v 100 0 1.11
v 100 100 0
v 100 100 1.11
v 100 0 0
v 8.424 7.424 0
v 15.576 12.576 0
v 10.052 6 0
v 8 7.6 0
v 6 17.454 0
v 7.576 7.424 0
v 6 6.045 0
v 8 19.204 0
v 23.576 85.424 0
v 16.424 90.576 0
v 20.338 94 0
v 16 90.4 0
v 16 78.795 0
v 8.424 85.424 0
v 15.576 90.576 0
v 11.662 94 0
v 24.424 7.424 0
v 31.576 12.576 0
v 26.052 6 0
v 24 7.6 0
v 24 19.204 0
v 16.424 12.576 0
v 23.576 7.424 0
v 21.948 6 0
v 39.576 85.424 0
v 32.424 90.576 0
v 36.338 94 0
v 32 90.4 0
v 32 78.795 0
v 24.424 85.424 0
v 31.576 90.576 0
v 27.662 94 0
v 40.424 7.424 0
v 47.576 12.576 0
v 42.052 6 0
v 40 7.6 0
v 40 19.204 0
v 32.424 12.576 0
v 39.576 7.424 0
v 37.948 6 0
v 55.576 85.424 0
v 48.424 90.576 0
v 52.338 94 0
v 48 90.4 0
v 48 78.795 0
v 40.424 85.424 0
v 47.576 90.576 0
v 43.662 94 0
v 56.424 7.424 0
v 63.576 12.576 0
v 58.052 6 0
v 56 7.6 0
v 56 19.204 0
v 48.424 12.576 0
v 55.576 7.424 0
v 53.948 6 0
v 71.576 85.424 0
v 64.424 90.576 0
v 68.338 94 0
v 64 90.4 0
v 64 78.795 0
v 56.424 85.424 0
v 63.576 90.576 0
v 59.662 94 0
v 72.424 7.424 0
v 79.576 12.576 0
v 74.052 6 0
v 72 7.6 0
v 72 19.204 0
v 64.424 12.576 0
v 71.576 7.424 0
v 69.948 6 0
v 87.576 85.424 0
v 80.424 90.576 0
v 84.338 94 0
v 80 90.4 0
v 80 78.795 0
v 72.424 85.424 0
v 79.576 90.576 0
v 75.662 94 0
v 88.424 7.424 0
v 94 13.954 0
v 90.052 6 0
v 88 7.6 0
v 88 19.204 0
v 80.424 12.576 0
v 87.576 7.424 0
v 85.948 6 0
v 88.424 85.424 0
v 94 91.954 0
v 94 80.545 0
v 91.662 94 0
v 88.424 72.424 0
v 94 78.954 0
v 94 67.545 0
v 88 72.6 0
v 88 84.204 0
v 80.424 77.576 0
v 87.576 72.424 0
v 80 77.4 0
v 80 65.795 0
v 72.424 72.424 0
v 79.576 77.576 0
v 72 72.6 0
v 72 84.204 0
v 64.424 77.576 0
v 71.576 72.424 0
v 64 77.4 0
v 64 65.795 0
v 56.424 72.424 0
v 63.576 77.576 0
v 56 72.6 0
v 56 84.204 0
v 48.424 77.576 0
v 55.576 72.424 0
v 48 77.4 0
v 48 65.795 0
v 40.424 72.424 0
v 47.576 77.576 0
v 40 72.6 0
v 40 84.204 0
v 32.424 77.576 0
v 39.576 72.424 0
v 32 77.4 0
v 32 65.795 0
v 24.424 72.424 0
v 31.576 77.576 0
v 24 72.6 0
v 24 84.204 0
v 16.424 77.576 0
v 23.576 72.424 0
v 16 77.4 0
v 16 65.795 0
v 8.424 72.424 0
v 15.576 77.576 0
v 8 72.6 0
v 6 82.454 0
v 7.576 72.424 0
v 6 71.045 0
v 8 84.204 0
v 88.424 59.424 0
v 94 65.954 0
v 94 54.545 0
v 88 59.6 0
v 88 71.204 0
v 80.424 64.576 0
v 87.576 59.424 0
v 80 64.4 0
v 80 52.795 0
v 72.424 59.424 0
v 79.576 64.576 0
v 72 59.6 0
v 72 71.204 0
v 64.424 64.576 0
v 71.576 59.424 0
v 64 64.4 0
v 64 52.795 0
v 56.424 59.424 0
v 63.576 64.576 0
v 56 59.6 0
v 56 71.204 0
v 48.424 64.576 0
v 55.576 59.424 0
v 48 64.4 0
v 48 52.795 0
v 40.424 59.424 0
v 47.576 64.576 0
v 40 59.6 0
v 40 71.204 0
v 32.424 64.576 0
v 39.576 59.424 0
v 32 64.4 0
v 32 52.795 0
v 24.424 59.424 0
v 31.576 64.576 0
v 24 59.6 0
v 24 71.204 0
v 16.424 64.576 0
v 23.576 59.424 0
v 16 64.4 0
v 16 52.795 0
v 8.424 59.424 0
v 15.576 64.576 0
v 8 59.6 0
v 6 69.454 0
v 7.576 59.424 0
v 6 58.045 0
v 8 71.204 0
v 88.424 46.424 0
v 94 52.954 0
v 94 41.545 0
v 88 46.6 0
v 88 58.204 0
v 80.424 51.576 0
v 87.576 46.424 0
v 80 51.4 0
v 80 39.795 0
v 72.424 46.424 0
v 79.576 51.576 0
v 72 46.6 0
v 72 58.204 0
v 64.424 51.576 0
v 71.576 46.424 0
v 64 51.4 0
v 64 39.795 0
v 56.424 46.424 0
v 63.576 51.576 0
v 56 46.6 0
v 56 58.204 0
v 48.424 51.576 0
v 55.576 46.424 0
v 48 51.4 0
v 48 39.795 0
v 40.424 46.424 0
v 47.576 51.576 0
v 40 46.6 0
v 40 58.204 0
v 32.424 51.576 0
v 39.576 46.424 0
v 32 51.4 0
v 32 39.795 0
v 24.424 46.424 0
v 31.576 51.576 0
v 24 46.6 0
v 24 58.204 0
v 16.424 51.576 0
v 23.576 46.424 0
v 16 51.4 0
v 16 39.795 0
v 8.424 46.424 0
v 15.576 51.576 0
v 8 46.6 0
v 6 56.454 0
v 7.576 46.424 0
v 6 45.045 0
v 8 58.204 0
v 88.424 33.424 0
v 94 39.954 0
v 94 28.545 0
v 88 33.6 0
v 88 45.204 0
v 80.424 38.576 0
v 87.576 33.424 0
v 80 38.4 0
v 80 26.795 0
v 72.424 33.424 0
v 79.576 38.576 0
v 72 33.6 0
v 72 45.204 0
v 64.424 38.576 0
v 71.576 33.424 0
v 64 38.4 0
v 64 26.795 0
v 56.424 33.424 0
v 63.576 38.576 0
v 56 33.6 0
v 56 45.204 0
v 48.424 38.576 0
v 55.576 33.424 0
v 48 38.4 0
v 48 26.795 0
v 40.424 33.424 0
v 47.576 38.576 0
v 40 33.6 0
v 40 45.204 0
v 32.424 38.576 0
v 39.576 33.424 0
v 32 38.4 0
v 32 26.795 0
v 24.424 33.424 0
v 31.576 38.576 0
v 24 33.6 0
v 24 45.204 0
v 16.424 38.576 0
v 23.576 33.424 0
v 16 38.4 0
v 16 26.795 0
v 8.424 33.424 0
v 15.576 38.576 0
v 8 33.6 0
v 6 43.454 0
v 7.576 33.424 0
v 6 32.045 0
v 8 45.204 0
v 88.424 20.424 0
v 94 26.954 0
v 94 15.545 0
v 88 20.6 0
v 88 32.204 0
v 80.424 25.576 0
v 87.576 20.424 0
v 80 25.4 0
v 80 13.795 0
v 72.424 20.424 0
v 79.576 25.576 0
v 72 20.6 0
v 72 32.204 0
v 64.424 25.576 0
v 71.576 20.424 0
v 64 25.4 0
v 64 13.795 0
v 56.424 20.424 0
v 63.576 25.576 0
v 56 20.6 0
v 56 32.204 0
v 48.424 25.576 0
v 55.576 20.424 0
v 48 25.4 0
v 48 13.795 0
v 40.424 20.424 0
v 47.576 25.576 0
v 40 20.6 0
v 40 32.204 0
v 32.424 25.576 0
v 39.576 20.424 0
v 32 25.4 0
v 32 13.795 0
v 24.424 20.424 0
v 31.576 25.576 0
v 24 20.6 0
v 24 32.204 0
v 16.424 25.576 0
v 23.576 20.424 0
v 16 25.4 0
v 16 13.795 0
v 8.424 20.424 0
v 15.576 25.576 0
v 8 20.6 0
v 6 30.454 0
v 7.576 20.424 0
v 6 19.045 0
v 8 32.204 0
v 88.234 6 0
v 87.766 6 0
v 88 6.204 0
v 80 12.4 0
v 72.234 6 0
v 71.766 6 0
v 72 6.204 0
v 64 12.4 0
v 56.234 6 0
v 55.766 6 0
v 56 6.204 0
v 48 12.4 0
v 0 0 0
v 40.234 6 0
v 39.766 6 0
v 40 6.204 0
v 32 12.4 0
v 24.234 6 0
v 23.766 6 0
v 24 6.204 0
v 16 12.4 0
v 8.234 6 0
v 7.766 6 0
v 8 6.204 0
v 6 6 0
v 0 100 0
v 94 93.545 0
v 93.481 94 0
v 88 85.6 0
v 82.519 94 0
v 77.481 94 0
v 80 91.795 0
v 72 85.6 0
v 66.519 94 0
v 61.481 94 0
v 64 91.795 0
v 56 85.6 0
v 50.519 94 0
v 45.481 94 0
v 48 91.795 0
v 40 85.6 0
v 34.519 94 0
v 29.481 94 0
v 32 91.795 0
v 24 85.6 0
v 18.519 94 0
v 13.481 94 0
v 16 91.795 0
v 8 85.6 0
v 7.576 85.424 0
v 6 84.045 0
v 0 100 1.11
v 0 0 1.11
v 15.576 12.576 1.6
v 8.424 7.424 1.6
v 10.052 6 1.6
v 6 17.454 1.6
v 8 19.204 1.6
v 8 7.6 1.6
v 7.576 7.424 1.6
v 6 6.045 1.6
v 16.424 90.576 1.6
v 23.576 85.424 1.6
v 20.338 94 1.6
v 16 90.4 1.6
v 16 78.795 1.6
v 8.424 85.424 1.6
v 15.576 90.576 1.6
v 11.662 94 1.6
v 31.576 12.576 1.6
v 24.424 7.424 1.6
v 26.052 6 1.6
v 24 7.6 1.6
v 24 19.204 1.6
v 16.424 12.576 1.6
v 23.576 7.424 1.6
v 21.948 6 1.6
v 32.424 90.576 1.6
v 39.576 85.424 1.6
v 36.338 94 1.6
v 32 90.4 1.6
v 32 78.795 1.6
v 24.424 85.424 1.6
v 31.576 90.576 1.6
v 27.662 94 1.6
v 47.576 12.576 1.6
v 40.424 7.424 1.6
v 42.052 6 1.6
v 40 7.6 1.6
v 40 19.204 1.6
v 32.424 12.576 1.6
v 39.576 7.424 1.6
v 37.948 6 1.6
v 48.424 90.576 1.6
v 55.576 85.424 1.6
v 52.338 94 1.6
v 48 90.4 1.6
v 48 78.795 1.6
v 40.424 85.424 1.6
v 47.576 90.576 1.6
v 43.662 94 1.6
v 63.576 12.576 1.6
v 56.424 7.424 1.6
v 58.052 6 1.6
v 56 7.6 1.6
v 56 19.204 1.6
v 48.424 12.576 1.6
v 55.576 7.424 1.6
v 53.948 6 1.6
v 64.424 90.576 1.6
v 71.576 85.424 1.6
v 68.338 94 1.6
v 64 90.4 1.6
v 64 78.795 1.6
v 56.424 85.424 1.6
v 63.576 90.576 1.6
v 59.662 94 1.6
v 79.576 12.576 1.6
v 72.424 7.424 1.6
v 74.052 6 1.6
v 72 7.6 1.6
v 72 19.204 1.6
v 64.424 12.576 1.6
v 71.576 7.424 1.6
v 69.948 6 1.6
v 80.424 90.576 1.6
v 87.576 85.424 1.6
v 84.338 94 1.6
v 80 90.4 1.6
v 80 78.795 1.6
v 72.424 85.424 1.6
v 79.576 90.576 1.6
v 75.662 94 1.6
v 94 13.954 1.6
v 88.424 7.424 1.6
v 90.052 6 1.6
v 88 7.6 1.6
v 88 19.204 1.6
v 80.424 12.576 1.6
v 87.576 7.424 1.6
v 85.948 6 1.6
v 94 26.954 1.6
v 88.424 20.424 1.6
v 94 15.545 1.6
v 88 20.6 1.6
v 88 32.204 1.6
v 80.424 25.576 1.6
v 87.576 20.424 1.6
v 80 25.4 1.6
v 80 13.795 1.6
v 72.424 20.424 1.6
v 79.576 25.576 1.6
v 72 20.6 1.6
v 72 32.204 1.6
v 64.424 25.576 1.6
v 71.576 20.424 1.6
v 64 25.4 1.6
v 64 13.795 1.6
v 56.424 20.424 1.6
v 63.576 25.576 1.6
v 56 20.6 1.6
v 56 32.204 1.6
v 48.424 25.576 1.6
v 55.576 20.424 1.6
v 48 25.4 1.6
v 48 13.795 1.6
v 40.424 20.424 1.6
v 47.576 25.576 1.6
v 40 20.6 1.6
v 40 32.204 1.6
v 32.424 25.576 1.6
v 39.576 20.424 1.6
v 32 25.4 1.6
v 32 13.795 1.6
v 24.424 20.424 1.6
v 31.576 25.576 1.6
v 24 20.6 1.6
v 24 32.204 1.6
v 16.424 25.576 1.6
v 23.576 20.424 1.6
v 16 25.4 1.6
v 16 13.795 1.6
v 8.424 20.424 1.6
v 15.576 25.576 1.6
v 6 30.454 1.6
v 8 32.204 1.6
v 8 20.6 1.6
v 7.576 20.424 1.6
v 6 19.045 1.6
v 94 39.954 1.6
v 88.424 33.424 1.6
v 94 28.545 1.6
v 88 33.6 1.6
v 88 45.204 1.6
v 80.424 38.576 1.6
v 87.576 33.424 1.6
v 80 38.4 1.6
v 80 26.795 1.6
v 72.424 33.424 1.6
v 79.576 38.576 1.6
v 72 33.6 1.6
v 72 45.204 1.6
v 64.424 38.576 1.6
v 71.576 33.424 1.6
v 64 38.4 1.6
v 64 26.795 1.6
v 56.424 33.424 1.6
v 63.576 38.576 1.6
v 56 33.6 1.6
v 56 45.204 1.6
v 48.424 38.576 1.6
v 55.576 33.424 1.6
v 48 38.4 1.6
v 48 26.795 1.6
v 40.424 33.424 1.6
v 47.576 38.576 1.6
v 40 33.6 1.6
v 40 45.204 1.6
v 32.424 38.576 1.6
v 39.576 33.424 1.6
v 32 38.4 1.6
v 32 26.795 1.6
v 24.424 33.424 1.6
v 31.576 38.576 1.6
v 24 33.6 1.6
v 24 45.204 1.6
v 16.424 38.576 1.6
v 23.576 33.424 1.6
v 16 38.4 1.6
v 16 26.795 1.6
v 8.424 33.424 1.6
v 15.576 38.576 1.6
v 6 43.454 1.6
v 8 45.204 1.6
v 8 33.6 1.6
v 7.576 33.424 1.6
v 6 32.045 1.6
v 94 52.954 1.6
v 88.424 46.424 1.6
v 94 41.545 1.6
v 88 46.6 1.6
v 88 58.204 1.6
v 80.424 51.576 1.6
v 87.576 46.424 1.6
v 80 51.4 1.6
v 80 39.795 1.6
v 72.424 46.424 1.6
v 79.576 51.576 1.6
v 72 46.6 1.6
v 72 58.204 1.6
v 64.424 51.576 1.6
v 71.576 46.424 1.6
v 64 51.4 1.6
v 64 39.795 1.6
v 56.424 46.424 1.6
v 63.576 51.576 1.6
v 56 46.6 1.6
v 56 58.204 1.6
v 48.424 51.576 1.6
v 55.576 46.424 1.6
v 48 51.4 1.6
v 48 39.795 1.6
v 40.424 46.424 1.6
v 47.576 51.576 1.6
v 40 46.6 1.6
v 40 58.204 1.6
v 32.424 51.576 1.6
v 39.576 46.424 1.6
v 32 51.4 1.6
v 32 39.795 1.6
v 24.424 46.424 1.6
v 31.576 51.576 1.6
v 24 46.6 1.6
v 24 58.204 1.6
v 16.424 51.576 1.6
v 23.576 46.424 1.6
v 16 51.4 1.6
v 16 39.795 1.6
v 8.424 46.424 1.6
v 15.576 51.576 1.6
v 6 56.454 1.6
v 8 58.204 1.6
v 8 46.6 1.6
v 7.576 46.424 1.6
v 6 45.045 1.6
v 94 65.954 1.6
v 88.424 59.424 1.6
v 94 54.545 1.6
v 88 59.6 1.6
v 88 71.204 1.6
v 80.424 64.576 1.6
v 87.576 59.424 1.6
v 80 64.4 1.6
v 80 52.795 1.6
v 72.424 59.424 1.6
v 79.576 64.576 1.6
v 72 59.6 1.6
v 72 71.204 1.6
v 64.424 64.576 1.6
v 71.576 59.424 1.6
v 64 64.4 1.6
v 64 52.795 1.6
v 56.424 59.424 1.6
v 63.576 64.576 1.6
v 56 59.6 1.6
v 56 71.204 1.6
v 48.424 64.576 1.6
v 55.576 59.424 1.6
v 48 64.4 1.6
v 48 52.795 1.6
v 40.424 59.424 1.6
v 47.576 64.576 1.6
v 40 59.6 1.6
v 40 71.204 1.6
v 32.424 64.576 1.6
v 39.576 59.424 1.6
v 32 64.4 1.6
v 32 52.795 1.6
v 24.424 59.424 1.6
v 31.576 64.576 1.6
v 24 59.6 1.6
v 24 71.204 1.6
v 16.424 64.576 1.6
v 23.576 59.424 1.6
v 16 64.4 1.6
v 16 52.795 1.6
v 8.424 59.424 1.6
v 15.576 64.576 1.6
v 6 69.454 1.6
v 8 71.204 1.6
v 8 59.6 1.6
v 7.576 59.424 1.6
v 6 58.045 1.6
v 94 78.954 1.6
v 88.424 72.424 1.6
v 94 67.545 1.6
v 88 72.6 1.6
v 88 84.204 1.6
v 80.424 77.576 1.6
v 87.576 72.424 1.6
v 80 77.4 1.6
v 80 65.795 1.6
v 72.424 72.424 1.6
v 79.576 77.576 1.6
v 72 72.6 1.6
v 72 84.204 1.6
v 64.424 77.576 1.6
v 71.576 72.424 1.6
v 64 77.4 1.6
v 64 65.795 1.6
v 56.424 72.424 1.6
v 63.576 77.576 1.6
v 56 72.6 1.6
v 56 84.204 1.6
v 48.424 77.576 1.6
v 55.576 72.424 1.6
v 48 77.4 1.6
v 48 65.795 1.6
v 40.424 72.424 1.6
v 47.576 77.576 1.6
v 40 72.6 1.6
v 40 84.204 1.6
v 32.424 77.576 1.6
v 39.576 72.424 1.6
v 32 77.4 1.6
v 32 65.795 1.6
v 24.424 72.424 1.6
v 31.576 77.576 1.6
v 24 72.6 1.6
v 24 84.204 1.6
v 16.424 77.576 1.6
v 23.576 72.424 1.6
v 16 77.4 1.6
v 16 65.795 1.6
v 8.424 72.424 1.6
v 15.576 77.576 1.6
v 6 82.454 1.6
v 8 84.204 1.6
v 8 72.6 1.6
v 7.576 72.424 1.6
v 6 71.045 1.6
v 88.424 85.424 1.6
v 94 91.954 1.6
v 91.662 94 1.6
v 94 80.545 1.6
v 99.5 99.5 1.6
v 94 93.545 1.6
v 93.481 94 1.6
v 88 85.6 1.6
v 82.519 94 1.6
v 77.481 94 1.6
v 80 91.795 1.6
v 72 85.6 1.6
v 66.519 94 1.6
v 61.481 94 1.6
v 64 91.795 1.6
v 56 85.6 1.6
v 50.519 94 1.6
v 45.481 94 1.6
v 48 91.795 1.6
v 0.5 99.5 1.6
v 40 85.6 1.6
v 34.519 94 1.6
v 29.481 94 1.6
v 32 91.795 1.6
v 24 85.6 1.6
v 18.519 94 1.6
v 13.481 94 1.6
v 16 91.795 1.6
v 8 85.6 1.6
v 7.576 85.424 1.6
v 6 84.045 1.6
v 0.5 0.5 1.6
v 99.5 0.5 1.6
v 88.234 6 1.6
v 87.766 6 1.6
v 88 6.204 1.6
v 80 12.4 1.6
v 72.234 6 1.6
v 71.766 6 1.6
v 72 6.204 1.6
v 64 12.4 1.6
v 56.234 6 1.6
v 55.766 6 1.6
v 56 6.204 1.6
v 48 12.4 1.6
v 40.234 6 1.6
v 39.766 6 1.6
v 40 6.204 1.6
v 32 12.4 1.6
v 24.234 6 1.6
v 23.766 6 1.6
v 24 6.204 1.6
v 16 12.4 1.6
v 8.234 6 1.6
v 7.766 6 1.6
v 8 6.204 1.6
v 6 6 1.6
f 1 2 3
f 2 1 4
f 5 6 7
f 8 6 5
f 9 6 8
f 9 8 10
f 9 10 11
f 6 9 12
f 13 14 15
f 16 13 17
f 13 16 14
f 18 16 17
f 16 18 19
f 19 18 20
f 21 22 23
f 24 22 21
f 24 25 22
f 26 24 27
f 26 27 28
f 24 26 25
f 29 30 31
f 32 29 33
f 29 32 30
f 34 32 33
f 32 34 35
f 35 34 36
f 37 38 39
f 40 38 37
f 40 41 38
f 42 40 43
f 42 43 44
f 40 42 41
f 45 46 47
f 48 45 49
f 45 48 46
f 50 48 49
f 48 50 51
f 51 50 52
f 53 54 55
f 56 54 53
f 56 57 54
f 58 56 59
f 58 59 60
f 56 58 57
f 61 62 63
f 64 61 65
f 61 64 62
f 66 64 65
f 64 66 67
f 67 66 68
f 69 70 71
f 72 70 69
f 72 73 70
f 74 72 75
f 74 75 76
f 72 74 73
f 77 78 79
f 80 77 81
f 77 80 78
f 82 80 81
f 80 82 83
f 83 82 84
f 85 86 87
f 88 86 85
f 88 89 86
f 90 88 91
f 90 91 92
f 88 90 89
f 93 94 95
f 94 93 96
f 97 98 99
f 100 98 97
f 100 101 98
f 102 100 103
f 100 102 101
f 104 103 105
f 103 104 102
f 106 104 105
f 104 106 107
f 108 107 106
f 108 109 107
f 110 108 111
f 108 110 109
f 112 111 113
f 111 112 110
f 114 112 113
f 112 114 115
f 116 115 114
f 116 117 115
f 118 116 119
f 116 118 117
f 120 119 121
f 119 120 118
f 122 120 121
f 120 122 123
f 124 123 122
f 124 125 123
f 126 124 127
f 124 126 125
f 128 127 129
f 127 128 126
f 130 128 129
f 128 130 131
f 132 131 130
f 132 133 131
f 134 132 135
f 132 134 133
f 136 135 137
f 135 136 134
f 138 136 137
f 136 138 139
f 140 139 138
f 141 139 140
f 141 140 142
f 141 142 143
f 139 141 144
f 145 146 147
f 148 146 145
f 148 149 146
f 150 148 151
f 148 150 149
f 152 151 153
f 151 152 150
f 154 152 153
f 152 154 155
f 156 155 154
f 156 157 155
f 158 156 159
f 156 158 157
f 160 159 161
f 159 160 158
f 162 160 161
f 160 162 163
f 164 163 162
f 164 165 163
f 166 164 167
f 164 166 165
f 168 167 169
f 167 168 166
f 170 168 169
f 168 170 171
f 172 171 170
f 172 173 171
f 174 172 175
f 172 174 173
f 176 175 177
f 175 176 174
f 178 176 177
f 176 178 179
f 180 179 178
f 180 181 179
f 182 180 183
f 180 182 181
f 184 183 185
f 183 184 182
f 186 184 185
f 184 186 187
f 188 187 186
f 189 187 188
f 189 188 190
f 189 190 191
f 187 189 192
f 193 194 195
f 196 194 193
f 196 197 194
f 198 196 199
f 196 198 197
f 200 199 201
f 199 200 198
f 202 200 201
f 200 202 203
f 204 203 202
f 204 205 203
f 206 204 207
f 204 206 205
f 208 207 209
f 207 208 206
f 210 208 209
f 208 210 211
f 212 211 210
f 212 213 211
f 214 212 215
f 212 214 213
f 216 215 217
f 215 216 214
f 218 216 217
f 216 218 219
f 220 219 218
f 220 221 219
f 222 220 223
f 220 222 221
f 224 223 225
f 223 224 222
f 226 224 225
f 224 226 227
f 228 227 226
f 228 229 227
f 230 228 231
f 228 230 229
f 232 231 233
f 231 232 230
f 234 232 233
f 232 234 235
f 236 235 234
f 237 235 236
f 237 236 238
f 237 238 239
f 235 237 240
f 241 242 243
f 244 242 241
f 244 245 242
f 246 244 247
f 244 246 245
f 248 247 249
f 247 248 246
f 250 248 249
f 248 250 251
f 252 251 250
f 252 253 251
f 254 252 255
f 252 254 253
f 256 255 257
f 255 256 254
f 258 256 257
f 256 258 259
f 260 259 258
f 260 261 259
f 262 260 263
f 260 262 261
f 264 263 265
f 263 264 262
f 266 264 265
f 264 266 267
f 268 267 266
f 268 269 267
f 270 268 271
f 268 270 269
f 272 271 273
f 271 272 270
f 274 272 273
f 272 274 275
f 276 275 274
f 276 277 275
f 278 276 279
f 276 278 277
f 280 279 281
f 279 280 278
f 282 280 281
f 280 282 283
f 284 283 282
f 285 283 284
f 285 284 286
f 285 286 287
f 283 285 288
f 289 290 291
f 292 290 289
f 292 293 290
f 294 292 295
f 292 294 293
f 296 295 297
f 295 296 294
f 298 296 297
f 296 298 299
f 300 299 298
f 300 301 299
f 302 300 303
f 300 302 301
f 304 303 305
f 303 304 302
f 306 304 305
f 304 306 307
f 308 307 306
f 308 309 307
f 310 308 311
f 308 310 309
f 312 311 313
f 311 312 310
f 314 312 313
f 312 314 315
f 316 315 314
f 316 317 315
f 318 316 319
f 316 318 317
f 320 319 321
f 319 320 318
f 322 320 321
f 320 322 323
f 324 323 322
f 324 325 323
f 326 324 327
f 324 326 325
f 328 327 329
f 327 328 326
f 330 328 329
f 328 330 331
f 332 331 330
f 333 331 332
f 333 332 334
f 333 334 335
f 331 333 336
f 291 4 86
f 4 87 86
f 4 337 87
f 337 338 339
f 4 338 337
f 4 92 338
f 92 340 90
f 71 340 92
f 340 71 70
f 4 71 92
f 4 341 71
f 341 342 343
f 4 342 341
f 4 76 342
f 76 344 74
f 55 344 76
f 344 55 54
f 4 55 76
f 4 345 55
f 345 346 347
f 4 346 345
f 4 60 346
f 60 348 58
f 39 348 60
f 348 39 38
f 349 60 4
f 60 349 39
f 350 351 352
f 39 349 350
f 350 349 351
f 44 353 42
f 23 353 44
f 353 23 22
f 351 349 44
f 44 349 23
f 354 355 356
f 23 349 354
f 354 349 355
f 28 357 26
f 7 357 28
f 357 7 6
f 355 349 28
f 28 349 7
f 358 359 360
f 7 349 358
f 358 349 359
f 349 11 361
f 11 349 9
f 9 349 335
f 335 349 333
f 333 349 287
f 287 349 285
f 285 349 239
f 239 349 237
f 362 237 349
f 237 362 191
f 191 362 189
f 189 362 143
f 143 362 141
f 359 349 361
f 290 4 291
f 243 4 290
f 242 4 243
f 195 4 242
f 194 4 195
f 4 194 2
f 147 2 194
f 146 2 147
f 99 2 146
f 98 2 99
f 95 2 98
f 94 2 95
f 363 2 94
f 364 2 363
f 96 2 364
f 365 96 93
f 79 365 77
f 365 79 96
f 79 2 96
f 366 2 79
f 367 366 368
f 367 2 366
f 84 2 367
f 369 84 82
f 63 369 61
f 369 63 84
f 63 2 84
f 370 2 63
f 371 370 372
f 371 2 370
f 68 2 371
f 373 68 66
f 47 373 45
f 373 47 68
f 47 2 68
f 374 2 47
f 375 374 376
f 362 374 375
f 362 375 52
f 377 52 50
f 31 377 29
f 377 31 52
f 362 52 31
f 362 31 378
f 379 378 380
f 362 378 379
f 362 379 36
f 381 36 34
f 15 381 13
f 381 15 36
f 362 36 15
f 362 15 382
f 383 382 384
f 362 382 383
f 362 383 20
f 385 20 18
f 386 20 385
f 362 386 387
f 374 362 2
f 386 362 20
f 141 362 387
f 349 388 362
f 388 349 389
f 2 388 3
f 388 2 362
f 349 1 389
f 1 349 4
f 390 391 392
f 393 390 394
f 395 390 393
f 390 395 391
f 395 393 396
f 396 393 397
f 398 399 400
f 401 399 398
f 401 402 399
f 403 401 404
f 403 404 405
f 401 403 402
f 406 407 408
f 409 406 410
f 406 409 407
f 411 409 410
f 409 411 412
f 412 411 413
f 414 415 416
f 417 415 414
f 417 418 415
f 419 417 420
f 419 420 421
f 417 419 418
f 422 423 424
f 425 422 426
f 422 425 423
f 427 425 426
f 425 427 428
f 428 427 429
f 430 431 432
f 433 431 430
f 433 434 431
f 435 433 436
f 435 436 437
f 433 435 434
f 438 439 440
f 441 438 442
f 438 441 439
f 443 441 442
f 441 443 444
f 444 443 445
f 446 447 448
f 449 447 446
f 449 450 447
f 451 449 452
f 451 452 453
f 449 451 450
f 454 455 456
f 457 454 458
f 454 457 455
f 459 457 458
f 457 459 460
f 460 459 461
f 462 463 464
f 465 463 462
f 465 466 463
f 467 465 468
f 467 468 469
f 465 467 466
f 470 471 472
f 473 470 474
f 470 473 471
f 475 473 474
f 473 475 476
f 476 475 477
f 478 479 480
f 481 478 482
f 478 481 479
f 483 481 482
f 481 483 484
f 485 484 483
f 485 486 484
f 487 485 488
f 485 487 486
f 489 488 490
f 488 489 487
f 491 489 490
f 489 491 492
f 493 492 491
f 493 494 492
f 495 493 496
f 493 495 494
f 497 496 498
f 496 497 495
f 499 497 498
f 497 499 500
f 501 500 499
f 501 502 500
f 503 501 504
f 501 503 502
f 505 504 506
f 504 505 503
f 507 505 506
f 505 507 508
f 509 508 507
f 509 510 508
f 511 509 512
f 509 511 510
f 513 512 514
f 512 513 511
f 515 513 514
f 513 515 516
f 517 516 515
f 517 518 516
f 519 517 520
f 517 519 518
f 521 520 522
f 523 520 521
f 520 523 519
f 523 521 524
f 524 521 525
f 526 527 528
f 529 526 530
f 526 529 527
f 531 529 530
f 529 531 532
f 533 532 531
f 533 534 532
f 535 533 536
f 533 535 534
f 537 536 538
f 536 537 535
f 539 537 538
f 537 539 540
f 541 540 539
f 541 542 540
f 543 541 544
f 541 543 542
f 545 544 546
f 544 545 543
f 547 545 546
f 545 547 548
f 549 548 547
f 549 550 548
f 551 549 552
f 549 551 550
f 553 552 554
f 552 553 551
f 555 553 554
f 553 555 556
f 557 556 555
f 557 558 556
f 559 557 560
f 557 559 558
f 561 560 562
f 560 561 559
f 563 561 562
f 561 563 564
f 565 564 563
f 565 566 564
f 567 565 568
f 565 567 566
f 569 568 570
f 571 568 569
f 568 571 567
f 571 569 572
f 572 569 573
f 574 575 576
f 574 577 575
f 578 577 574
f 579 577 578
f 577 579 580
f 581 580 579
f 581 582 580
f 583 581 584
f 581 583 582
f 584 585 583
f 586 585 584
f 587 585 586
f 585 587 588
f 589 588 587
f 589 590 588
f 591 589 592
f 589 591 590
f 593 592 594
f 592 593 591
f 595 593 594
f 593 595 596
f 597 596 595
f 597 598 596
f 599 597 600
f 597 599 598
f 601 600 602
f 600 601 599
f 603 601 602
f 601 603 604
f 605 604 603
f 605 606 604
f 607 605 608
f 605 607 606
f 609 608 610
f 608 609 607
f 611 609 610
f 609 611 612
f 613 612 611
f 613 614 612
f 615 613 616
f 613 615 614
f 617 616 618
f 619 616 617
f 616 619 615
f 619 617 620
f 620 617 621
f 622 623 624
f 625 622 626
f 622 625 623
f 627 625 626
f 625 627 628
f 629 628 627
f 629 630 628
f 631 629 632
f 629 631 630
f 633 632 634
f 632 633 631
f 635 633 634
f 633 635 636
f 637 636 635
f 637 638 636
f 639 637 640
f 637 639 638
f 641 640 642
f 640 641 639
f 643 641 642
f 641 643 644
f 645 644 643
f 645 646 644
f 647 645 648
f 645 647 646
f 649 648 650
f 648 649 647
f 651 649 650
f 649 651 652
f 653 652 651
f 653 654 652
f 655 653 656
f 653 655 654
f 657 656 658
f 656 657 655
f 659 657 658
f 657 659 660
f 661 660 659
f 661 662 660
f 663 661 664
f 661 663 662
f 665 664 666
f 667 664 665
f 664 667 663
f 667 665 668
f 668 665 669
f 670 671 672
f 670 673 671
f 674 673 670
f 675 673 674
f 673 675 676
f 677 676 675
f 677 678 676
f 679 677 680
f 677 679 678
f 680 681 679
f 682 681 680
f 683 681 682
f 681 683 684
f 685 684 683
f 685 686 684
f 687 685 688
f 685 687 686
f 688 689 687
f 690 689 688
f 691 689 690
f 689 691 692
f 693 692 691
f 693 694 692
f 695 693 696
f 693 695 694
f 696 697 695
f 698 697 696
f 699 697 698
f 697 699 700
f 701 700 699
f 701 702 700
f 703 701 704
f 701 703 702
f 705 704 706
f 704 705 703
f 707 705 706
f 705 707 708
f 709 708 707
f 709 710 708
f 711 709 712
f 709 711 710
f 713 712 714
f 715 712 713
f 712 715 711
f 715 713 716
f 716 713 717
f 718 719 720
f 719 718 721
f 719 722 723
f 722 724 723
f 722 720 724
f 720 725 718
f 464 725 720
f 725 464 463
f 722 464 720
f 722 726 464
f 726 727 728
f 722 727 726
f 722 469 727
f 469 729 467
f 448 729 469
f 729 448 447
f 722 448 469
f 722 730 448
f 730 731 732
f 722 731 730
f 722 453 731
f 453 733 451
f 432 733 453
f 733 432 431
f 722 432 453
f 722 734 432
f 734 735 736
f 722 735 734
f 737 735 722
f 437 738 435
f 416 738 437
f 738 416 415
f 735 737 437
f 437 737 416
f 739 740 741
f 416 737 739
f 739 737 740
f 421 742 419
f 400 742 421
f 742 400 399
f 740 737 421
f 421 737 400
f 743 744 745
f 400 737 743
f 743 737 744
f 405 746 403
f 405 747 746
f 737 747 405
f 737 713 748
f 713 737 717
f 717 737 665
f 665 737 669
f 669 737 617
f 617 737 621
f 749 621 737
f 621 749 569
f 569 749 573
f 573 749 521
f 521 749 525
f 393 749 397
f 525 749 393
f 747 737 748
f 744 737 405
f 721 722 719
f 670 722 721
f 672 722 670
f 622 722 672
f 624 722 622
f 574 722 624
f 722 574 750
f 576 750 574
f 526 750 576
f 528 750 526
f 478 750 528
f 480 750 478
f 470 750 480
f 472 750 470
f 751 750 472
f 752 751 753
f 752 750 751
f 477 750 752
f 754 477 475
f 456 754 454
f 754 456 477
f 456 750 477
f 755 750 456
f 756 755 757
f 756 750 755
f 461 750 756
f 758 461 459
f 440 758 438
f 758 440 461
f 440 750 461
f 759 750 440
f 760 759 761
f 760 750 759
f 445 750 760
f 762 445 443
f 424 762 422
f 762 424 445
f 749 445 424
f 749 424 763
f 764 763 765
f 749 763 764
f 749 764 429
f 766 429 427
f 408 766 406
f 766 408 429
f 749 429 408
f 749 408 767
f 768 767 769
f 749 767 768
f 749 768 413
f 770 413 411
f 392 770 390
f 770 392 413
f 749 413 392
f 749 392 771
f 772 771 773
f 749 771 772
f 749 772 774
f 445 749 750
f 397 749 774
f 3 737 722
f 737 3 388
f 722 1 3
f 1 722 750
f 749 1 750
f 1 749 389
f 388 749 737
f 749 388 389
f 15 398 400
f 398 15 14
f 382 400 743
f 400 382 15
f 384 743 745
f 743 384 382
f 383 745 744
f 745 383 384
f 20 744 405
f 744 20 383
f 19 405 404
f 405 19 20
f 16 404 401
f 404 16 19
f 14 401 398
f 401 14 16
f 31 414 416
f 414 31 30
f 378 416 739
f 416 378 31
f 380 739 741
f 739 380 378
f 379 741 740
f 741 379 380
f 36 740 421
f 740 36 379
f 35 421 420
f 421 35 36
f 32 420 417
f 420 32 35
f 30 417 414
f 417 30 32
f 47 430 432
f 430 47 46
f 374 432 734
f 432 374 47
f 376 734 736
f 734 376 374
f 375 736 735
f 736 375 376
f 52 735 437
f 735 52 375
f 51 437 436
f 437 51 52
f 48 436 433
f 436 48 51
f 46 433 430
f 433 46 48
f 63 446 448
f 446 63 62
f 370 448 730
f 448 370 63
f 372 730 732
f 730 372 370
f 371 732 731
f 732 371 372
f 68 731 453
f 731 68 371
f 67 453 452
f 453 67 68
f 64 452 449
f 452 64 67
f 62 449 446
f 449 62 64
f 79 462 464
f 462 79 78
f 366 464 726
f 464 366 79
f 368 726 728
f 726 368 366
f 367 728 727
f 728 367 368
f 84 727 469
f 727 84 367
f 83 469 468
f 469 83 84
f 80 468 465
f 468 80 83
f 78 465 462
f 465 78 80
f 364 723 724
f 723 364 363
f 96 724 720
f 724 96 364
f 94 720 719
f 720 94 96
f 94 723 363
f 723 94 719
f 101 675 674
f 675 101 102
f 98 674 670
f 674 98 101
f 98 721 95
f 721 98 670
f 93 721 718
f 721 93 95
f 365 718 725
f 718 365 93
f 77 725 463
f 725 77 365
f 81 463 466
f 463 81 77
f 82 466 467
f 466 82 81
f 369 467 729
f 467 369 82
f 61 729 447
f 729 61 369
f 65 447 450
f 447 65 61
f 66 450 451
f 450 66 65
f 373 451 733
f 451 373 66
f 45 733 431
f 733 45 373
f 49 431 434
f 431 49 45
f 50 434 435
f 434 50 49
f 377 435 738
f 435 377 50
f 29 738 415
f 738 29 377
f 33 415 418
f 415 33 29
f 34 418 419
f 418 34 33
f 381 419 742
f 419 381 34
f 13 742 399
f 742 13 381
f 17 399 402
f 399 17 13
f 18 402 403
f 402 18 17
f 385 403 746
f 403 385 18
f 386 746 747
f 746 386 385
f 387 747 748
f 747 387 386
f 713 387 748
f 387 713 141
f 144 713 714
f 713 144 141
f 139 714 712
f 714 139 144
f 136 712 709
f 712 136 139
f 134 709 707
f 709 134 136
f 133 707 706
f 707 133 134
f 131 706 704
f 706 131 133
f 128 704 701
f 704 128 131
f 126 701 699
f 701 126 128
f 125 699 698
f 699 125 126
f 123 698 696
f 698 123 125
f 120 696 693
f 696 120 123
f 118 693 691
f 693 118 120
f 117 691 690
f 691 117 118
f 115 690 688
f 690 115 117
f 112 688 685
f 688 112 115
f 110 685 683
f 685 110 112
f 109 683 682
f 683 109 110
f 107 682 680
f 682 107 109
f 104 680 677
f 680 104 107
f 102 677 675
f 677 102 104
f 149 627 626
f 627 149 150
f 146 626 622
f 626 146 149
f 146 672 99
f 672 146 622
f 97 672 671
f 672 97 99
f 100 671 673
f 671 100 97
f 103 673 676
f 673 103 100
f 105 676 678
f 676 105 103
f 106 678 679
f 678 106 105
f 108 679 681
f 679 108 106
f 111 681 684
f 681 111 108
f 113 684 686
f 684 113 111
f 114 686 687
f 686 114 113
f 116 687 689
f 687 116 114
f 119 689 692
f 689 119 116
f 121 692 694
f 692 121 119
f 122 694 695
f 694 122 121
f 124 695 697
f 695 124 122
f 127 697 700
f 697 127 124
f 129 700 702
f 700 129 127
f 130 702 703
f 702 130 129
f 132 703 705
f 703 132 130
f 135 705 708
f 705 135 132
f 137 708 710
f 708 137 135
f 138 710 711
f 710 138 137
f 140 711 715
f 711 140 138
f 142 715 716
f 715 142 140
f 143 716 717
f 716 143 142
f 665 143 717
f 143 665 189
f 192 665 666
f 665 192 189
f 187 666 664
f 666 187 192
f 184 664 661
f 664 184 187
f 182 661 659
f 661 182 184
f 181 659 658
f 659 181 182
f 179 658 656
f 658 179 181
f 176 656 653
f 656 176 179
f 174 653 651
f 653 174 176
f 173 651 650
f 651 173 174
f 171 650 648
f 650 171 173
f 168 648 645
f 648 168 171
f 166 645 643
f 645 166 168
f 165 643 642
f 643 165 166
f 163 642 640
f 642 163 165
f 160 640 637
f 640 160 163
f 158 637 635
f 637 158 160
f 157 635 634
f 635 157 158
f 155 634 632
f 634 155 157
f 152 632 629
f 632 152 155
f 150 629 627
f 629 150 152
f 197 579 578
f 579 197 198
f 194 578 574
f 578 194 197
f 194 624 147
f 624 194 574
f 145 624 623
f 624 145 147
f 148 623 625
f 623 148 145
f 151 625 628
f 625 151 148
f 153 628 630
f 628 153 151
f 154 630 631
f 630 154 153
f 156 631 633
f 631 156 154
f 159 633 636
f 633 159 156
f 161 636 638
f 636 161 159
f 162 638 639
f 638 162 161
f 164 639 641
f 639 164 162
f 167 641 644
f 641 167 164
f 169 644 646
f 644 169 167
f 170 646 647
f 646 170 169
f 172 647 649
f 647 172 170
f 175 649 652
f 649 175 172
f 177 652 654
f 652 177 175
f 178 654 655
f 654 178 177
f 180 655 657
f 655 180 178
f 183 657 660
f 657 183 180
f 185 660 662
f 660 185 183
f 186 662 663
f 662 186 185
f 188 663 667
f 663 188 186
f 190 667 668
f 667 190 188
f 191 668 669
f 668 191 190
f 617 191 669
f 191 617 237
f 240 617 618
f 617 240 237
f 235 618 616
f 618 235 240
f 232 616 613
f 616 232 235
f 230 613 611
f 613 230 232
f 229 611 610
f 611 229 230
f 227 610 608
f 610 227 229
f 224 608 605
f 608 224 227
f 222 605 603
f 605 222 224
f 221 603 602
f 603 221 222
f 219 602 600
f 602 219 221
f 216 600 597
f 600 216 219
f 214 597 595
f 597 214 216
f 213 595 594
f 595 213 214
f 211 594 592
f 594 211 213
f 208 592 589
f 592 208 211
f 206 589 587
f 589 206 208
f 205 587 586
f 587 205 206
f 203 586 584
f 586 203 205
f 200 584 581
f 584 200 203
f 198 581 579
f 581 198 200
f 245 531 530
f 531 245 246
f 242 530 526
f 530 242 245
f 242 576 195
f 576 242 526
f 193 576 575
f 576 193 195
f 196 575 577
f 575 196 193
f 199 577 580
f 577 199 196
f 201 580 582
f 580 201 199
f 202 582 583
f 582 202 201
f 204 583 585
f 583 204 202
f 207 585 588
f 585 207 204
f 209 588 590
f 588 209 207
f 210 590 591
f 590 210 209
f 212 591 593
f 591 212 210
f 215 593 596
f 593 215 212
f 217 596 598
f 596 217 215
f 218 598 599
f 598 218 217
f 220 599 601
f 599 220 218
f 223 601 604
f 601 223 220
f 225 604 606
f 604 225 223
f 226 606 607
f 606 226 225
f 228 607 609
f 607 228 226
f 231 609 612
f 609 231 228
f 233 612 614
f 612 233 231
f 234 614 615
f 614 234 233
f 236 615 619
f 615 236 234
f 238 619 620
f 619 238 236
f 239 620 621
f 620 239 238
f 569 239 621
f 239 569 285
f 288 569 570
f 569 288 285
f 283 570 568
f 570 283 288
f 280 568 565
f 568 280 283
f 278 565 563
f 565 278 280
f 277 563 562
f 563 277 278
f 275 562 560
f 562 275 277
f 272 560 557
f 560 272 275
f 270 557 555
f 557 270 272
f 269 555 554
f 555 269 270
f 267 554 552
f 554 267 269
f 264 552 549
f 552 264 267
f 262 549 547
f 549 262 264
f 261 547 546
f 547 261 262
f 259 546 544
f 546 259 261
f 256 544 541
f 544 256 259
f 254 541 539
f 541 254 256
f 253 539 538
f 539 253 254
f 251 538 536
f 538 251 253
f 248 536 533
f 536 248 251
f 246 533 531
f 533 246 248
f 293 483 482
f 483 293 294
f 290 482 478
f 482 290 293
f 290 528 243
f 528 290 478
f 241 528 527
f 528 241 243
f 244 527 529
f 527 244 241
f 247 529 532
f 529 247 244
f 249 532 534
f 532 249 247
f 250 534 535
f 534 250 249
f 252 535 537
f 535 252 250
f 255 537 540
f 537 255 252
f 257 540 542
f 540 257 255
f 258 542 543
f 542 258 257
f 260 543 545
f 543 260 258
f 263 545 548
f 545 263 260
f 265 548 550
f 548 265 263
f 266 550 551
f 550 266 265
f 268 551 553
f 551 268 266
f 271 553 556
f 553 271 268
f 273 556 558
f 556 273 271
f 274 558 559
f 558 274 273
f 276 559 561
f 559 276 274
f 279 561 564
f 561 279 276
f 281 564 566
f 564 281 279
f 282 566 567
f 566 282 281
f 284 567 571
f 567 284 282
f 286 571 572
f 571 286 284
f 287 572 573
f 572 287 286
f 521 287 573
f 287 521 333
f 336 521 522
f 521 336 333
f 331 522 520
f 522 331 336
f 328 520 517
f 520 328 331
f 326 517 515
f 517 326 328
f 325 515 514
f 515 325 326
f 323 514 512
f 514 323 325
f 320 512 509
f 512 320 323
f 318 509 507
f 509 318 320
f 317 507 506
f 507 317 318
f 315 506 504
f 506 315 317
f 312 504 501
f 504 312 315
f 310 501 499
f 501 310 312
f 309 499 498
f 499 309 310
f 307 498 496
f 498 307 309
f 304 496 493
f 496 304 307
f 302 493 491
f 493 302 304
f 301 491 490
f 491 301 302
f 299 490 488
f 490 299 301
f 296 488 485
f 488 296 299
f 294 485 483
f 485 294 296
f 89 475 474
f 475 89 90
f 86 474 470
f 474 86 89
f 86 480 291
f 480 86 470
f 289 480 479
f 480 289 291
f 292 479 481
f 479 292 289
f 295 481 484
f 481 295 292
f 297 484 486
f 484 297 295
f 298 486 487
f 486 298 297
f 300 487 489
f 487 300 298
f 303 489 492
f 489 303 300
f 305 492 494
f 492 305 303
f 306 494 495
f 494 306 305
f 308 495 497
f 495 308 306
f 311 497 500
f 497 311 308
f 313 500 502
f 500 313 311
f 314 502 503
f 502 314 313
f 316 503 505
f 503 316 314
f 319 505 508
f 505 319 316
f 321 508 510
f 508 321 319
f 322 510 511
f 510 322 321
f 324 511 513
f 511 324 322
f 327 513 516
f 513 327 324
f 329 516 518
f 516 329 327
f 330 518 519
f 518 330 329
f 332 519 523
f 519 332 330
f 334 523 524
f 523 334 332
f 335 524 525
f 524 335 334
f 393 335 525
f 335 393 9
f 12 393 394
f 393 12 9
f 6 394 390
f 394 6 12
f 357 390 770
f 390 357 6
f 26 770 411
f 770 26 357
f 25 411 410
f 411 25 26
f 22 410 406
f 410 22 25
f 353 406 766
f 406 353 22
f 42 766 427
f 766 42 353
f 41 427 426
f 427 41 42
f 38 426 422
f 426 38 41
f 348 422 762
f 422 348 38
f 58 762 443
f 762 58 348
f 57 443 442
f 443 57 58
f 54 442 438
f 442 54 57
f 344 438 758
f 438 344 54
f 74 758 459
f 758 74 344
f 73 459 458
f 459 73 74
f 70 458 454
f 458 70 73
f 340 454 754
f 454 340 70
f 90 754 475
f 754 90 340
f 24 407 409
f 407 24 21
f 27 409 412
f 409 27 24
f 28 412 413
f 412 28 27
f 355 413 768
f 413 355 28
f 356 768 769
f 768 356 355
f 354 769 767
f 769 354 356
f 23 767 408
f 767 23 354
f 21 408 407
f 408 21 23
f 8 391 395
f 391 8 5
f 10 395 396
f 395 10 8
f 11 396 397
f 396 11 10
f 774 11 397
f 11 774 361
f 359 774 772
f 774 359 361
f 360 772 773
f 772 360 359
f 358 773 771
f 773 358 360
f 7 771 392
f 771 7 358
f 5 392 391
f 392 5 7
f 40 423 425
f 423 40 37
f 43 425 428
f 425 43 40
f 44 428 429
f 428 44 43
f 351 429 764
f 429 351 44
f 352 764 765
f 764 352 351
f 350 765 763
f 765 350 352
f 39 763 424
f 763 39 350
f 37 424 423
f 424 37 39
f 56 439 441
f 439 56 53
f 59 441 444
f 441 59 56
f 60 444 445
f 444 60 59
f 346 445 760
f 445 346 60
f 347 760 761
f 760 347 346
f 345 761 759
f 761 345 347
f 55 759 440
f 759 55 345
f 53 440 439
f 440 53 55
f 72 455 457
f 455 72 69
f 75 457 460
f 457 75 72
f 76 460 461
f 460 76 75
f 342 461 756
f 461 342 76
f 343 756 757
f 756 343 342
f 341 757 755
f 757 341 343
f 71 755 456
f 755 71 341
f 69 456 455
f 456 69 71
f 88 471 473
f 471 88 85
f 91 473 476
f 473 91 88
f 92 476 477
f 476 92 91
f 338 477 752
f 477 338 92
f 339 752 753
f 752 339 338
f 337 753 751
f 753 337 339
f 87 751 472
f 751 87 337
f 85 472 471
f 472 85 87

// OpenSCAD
// file: sashiko_config.scad
// sashiko_config.scad
// Shared plate configuration for every sashiko template. Change a value here and
// it applies to all templates at once. Each template `include`s this file — use
// `include`, NOT `use`, because `use` does not import top-level variables — and
// keeps only its own pattern-specific parameters (scale, corner_gap, bridges …).

plate_w  = 100;   // plate width (mm)
plate_h  = 100;   // plate height (mm)
plate_t  = 1.6;   // plate thickness (mm) — slots are cut through all of it
groove_w = 1.2;   // slot width (mm)
border   = 6;     // solid border around plate edge (mm)
chamfer  = 0.5;   // 45° bevel on the four outer top edges (mm; 0 = off, keep <= t/2)
// file: sashiko_lib.scad
// sashiko_lib.scad
// Shared geometry helpers for sashiko stitch-guide templates.
//
// The slot pattern is built entirely in 2D and extruded ONCE at the end (see
// sashiko_plate). This is far faster than unioning thousands of 3D solids.
//
// Slots are cut FULL-THICKNESS so a marking pen/chalk reaches the fabric, and
// are interrupted by small solid "bridges" so the enclosed regions of a
// continuous-line pattern stay attached to the plate instead of dropping out.

// --- low level (2D) -------------------------------------------------------

// 2D rounded slot dash (a "stadium") between two points.
module slot_dash(p1, p2, r) {
    hull() {
        translate(p1) circle(r = r, $fn = 8);
        translate(p2) circle(r = r, $fn = 8);
    }
}

// --- straight slot with periodic bridges ---------------------------------

// Straight slot p1->p2. Always leaves >=1 bridge (so the faces on either side
// stay connected); long runs get extra bridges at ~bridge_sp spacing.
// Dash ends are pulled in by the cap radius r so the *solid* tab left behind
// is bridge_w wide (not bridge_w - 2r).
module bridged_line(p1, p2, r, bridge_w, bridge_sp) {
    L = norm([p2[0] - p1[0], p2[1] - p1[1]]);
    if (L > 0.001) {
        dir = [(p2[0] - p1[0]) / L, (p2[1] - p1[1]) / L];
        hw  = bridge_w / 2 + r;                  // half-gap incl. cap radius
        nb  = max(1, floor(L / bridge_sp));      // bridge count
        cuts   = [for (k = [1 : nb]) k * L / (nb + 1)];
        bounds = concat([0],
                        [for (c = cuts) each [c - hw, c + hw]],
                        [L]);
        for (i = [0 : len(bounds)/2 - 1]) {
            a = bounds[2*i];
            b = bounds[2*i + 1];
            if (b - a > 0.05)
                slot_dash([p1[0] + dir[0]*a, p1[1] + dir[1]*a],
                          [p1[0] + dir[0]*b, p1[1] + dir[1]*b], r);
        }
    }
}

// --- circular slot with bridges at given angles --------------------------

// Smooth thick arc from angle a1 to a2 (degrees) on circle (centre c, radius R).
module arc_run(c, R, r, a1, a2) {
    span  = a2 - a1;
    steps = max(1, ceil(abs(span) / 6));
    for (i = [0 : steps - 1]) {
        t1 = a1 + span * i       / steps;
        t2 = a1 + span * (i + 1) / steps;
        slot_dash([c[0] + R*cos(t1), c[1] + R*sin(t1)],
                  [c[0] + R*cos(t2), c[1] + R*sin(t2)], r);
    }
}

// Open arc slot (a1->a2 degrees) with periodic bridges along its length.
// Unlike bridged_line it allows zero bridges on short arcs (an open arc does
// not enclose a region on its own).
module bridged_arc(c, R, r, a1, a2, bridge_w, bridge_sp) {
    L  = R * abs(a2 - a1) * PI / 180;
    nb = floor(L / bridge_sp);
    ha = (bridge_w / 2 + r) / R * 180 / PI;      // half gap in degrees
    cuts   = nb < 1 ? [] : [for (k = [1 : nb]) a1 + (a2 - a1) * k / (nb + 1)];
    bounds = concat([a1], [for (cg = cuts) each [cg - ha, cg + ha]], [a2]);
    for (i = [0 : len(bounds)/2 - 1]) {
        b1 = bounds[2*i];
        b2 = bounds[2*i + 1];
        if (b2 - b1 > 0.1) arc_run(c, R, r, b1, b2);
    }
}

// Full circle slot, broken by a bridge centred on each angle in bridge_angles.
module bridged_circle(c, R, r, bridge_w, bridge_angles) {
    half = (bridge_w / 2 + r) / R * 180 / PI;   // half gap (deg), incl. caps
    n = len(bridge_angles);
    for (k = [0 : n - 1]) {
        a1 = bridge_angles[k];
        a2 = bridge_angles[(k + 1) % n] + (k == n - 1 ? 360 : 0);
        arc_run(c, R, r, a1 + half, a2 - half);
    }
}

// --- plate assembly -------------------------------------------------------

// Solid plate with the 2D pattern (children) cut through it, clipped to an
// inner border. The pattern is intersected with the inner rectangle and
// extruded a single time for speed.
//
// chamfer (mm, 0 = off) bevels the four OUTER top edges at 45°. It only touches
// the solid border (border > chamfer), never the slots, which are still cut
// full-thickness afterwards. Keep chamfer < t (ideally <= t/2).
module sashiko_plate(w, h, t, border, chamfer = 0, eps = 0.1) {
    difference() {
        if (chamfer > 0) chamfered_box(w, h, t, chamfer);
        else             cube([w, h, t]);
        translate([0, 0, -eps])
        linear_extrude(t + 2*eps)
        intersection() {
            translate([border, border])
                square([w - 2*border, h - 2*border]);
            children();
        }
    }
}

// A box whose four top outer edges are chamfered at 45° (c tall, c wide): full
// box up to t-c, then a frustum that insets by c over the last c of height.
module chamfered_box(w, h, t, c) {
    union() {
        cube([w, h, t - c]);
        hull() {
            translate([0, 0, t - c]) linear_extrude(0.01) square([w, h]);
            translate([c, c, t - 0.01]) linear_extrude(0.01) square([w - 2*c, h - 2*c]);
        }
    }
}
// main file
// Description: **Yamagata** — Mountains (山形)
// Yamagata (Mountains / 山形) Sashiko Template
// Hitomezashi rows of zigzag "mountains". Each row is one continuous open
// zigzag, so nothing is enclosed and no bridges are needed.

use <sashiko_lib.scad>
include <sashiko_config.scad>

period    = 16;   // mountain width (one peak) — pattern scale (mm)
amp       = 7;    // mountain height (mm)
row_sp    = 13;   // vertical spacing between rows (mm)

r = groove_w / 2;

module zigzag(y0) {
    n = ceil(plate_w / (period/2)) + 2;
    pts = [for (k = [0 : n]) [k*(period/2), y0 + (k % 2 == 0 ? 0 : amp)]];
    for (k = [0 : len(pts)-2]) slot_dash(pts[k], pts[k+1], r);
}

sashiko_plate(plate_w, plate_h, plate_t, border, chamfer)
union()
    for (row = [0 : ceil(plate_h / row_sp) + 1])
        zigzag(row * row_sp);
